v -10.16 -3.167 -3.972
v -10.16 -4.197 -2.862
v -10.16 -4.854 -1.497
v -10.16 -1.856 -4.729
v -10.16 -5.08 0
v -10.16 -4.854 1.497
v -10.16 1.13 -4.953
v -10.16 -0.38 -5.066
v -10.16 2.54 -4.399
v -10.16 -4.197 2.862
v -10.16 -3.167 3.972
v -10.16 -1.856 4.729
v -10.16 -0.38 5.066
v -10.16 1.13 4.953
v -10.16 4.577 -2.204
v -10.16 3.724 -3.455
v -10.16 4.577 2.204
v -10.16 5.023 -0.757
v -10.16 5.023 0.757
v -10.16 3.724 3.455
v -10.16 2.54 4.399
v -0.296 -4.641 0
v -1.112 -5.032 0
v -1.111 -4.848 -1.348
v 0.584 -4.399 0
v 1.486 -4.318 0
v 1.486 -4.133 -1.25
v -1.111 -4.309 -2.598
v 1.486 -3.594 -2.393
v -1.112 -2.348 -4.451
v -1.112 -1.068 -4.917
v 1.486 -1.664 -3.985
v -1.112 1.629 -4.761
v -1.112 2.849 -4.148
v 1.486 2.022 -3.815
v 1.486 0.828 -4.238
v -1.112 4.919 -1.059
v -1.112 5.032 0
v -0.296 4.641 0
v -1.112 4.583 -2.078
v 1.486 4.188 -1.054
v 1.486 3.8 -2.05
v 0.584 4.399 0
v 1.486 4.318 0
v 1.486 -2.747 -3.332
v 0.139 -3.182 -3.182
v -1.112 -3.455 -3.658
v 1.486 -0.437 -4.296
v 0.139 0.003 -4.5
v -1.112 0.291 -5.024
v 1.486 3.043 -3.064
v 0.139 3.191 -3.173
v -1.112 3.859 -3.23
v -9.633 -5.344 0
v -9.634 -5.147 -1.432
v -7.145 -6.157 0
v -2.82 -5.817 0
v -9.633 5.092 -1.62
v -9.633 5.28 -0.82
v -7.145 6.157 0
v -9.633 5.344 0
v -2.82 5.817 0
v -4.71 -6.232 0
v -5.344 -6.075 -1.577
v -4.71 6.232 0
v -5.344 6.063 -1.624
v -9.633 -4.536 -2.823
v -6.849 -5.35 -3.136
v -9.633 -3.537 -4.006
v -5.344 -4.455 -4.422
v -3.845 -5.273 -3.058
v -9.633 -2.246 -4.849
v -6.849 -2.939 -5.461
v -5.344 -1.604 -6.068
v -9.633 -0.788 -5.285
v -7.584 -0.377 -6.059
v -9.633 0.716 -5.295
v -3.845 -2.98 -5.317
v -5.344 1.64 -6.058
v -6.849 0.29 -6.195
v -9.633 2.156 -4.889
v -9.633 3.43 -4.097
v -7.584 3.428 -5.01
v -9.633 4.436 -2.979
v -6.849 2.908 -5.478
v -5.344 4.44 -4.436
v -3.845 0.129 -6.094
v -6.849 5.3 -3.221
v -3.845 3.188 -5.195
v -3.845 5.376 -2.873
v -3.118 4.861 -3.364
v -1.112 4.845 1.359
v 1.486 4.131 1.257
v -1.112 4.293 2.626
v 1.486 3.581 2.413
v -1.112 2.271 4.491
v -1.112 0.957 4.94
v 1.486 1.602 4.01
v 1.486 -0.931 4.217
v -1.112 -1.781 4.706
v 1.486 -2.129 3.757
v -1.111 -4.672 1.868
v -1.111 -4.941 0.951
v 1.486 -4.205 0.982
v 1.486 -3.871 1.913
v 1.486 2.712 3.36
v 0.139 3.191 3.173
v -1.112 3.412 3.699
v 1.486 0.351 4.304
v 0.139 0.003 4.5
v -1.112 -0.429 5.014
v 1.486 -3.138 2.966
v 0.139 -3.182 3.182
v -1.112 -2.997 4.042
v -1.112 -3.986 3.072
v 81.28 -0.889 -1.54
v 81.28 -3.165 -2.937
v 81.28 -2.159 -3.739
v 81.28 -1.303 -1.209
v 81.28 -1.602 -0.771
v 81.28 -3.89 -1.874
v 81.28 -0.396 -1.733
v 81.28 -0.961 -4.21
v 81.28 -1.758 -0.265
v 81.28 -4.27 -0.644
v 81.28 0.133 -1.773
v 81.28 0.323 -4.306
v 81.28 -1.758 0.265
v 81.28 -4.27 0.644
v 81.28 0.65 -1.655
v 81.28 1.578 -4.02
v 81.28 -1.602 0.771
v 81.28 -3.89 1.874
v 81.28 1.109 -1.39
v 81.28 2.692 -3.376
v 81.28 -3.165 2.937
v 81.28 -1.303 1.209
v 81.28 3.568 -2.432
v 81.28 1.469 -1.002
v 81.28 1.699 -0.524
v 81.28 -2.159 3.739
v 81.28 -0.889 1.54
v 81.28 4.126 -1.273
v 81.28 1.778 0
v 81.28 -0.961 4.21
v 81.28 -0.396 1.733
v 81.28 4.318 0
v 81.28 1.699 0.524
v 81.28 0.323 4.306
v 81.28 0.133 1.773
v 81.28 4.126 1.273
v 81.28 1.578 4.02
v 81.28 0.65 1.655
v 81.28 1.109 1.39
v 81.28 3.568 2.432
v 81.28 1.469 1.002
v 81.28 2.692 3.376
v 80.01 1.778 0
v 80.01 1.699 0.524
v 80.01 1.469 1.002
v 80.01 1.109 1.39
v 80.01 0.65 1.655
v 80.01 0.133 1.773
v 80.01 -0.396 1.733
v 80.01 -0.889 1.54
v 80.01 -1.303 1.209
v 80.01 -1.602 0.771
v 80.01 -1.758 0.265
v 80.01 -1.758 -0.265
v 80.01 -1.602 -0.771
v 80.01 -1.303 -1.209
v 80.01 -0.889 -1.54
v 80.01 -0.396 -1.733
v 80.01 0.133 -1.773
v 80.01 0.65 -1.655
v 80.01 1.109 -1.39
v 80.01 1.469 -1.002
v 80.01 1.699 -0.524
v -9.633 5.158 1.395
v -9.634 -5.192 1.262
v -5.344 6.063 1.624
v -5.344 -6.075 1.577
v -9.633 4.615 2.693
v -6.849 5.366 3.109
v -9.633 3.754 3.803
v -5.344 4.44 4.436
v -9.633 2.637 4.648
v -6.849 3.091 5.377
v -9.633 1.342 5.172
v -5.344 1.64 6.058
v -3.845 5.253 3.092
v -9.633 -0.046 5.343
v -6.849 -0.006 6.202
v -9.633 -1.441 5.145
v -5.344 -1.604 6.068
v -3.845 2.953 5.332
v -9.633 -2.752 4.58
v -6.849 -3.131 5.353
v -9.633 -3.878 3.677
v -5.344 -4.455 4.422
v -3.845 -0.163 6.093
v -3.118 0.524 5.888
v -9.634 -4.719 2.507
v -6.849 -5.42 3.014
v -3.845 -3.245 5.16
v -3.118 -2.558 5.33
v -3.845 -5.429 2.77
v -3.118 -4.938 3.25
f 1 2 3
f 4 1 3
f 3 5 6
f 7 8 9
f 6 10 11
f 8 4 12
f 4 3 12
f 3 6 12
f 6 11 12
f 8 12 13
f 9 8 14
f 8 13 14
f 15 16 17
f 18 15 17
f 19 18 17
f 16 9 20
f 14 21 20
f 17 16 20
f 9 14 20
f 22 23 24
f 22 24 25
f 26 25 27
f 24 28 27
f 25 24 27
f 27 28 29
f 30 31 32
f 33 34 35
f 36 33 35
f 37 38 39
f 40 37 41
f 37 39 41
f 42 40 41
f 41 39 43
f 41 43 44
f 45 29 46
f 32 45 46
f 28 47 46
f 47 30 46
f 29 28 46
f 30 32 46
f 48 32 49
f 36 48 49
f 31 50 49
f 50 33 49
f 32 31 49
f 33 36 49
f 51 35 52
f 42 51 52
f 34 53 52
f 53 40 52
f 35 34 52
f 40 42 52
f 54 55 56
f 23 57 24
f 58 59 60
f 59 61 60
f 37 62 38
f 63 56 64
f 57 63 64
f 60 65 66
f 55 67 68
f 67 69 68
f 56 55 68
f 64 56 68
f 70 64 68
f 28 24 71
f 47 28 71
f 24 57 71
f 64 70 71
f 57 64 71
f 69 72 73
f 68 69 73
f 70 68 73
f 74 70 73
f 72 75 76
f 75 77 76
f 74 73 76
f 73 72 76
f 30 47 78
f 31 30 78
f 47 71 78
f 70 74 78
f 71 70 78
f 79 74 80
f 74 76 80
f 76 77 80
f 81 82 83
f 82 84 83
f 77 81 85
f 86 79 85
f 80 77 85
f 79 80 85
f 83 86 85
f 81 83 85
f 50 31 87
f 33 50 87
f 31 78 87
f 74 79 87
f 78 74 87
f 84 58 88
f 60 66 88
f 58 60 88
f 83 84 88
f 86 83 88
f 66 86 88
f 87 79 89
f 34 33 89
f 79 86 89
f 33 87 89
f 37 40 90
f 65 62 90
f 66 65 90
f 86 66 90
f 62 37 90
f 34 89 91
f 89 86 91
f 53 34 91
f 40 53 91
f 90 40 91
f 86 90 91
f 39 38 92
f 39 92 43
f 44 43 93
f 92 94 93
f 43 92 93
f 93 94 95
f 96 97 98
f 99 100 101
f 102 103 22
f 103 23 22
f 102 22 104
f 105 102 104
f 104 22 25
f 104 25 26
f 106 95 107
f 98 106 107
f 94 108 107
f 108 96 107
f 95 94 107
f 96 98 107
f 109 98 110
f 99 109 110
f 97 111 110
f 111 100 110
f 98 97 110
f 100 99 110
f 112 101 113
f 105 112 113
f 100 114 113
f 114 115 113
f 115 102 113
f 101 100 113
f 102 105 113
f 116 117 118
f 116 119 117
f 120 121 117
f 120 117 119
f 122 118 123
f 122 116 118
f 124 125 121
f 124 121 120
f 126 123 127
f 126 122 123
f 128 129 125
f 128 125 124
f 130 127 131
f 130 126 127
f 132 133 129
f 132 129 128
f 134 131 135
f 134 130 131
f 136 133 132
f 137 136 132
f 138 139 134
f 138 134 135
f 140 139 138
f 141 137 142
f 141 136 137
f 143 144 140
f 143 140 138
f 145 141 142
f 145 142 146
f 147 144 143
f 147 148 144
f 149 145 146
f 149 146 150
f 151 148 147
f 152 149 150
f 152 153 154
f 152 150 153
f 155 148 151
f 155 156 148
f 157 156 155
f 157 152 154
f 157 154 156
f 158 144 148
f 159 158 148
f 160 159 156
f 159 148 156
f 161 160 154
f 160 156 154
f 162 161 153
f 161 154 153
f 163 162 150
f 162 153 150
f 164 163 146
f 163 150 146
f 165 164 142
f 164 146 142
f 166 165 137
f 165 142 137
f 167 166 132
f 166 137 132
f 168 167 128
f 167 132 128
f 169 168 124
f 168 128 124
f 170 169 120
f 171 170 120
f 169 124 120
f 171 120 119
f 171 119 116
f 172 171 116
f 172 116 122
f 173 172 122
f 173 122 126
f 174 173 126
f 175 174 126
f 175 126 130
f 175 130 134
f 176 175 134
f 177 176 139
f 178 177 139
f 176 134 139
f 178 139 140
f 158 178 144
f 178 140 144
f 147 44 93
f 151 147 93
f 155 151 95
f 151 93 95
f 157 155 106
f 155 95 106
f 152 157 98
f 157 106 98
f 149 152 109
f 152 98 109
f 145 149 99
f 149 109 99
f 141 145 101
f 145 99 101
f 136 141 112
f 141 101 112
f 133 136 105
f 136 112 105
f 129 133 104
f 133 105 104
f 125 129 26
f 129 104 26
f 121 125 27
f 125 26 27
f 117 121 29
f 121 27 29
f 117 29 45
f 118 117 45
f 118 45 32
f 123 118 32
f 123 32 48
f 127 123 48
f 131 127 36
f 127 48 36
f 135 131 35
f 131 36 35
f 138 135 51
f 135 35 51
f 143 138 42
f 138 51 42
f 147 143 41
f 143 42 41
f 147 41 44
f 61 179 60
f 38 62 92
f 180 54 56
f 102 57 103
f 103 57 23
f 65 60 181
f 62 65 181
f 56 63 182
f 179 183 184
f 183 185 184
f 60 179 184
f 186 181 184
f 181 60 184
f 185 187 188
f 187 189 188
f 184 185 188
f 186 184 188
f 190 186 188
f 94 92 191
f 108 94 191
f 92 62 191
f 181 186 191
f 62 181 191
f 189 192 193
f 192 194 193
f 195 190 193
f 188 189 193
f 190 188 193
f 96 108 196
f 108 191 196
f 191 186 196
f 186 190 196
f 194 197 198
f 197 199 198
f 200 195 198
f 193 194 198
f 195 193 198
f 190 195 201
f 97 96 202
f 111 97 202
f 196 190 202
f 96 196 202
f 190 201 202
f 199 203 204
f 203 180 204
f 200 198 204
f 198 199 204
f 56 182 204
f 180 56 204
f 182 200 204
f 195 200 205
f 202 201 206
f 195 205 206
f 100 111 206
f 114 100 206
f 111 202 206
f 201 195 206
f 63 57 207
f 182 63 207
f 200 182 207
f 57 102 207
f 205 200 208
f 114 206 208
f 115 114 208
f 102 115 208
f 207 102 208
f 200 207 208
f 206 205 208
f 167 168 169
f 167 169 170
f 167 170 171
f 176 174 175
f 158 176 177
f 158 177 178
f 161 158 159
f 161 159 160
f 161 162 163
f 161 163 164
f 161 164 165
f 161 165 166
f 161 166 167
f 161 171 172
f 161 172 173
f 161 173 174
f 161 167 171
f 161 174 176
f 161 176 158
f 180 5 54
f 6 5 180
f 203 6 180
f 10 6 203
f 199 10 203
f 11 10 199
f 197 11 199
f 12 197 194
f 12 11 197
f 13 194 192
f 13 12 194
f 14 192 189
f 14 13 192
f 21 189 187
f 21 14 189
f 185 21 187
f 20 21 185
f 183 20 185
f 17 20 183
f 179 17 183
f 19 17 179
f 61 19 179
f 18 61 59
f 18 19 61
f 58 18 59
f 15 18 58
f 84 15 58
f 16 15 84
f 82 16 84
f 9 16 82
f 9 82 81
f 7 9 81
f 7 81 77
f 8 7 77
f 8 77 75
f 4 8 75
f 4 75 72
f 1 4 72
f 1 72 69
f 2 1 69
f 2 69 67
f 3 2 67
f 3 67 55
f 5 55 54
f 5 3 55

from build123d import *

# Parameters (mm, degrees)
F0_R      = 4.318
F1_DEPTH  = 81.28
F2_R      = 1.778
F3_DEPTH  = 1.27
F5_R      = 7.62
F6_FACE_R = 7.62
F8_R      = 5.08
F10_R     = 8.89
F11_R     = 5.08


with BuildPart() as f1:
    # F0 (on Right) → F1 (new body)
    with BuildSketch(Plane.YZ):
        Circle(F0_R)
    extrude(amount=F1_DEPTH)

    # F2 (on face) → F3 (cut)
    with BuildSketch(Plane.YZ.offset(81.28)):
        Circle(F2_R)
    extrude(amount=-F3_DEPTH, mode=Mode.SUBTRACT)

    # F0 (on Right) → F6 section 0
    with BuildSketch(Plane.YZ):
        Circle(F0_R)
    # F5 (on offset) → F6 section 1
    with BuildSketch(Plane.YZ.offset(-5.08)):
        Circle(F5_R)
    loft()

    # F6_face (on face) → F9 section 0
    with BuildSketch(Plane(origin=(-5.08, 0, 0), x_dir=(0, -1, 0), z_dir=(-1, 0, 0))):
        Circle(F6_FACE_R)
    # F8 (on offset) → F9 section 1
    with BuildSketch(Plane.YZ.offset(-10.16)):
        Circle(F8_R)
    loft()

    # F10
    f10_edges = [f1.edges().sort_by_distance(p)[0] for p in [
        (-5.08, 0, 7.62),
        (-5.08, 0, -7.62),
    ]]
    fillet(f10_edges, radius=F10_R)

    # F11
    f11_edges = [f1.edges().sort_by_distance(p)[0] for p in [
        (0, -4.318, 0),
    ]]
    fillet(f11_edges, radius=F11_R)


solid = f1.part
